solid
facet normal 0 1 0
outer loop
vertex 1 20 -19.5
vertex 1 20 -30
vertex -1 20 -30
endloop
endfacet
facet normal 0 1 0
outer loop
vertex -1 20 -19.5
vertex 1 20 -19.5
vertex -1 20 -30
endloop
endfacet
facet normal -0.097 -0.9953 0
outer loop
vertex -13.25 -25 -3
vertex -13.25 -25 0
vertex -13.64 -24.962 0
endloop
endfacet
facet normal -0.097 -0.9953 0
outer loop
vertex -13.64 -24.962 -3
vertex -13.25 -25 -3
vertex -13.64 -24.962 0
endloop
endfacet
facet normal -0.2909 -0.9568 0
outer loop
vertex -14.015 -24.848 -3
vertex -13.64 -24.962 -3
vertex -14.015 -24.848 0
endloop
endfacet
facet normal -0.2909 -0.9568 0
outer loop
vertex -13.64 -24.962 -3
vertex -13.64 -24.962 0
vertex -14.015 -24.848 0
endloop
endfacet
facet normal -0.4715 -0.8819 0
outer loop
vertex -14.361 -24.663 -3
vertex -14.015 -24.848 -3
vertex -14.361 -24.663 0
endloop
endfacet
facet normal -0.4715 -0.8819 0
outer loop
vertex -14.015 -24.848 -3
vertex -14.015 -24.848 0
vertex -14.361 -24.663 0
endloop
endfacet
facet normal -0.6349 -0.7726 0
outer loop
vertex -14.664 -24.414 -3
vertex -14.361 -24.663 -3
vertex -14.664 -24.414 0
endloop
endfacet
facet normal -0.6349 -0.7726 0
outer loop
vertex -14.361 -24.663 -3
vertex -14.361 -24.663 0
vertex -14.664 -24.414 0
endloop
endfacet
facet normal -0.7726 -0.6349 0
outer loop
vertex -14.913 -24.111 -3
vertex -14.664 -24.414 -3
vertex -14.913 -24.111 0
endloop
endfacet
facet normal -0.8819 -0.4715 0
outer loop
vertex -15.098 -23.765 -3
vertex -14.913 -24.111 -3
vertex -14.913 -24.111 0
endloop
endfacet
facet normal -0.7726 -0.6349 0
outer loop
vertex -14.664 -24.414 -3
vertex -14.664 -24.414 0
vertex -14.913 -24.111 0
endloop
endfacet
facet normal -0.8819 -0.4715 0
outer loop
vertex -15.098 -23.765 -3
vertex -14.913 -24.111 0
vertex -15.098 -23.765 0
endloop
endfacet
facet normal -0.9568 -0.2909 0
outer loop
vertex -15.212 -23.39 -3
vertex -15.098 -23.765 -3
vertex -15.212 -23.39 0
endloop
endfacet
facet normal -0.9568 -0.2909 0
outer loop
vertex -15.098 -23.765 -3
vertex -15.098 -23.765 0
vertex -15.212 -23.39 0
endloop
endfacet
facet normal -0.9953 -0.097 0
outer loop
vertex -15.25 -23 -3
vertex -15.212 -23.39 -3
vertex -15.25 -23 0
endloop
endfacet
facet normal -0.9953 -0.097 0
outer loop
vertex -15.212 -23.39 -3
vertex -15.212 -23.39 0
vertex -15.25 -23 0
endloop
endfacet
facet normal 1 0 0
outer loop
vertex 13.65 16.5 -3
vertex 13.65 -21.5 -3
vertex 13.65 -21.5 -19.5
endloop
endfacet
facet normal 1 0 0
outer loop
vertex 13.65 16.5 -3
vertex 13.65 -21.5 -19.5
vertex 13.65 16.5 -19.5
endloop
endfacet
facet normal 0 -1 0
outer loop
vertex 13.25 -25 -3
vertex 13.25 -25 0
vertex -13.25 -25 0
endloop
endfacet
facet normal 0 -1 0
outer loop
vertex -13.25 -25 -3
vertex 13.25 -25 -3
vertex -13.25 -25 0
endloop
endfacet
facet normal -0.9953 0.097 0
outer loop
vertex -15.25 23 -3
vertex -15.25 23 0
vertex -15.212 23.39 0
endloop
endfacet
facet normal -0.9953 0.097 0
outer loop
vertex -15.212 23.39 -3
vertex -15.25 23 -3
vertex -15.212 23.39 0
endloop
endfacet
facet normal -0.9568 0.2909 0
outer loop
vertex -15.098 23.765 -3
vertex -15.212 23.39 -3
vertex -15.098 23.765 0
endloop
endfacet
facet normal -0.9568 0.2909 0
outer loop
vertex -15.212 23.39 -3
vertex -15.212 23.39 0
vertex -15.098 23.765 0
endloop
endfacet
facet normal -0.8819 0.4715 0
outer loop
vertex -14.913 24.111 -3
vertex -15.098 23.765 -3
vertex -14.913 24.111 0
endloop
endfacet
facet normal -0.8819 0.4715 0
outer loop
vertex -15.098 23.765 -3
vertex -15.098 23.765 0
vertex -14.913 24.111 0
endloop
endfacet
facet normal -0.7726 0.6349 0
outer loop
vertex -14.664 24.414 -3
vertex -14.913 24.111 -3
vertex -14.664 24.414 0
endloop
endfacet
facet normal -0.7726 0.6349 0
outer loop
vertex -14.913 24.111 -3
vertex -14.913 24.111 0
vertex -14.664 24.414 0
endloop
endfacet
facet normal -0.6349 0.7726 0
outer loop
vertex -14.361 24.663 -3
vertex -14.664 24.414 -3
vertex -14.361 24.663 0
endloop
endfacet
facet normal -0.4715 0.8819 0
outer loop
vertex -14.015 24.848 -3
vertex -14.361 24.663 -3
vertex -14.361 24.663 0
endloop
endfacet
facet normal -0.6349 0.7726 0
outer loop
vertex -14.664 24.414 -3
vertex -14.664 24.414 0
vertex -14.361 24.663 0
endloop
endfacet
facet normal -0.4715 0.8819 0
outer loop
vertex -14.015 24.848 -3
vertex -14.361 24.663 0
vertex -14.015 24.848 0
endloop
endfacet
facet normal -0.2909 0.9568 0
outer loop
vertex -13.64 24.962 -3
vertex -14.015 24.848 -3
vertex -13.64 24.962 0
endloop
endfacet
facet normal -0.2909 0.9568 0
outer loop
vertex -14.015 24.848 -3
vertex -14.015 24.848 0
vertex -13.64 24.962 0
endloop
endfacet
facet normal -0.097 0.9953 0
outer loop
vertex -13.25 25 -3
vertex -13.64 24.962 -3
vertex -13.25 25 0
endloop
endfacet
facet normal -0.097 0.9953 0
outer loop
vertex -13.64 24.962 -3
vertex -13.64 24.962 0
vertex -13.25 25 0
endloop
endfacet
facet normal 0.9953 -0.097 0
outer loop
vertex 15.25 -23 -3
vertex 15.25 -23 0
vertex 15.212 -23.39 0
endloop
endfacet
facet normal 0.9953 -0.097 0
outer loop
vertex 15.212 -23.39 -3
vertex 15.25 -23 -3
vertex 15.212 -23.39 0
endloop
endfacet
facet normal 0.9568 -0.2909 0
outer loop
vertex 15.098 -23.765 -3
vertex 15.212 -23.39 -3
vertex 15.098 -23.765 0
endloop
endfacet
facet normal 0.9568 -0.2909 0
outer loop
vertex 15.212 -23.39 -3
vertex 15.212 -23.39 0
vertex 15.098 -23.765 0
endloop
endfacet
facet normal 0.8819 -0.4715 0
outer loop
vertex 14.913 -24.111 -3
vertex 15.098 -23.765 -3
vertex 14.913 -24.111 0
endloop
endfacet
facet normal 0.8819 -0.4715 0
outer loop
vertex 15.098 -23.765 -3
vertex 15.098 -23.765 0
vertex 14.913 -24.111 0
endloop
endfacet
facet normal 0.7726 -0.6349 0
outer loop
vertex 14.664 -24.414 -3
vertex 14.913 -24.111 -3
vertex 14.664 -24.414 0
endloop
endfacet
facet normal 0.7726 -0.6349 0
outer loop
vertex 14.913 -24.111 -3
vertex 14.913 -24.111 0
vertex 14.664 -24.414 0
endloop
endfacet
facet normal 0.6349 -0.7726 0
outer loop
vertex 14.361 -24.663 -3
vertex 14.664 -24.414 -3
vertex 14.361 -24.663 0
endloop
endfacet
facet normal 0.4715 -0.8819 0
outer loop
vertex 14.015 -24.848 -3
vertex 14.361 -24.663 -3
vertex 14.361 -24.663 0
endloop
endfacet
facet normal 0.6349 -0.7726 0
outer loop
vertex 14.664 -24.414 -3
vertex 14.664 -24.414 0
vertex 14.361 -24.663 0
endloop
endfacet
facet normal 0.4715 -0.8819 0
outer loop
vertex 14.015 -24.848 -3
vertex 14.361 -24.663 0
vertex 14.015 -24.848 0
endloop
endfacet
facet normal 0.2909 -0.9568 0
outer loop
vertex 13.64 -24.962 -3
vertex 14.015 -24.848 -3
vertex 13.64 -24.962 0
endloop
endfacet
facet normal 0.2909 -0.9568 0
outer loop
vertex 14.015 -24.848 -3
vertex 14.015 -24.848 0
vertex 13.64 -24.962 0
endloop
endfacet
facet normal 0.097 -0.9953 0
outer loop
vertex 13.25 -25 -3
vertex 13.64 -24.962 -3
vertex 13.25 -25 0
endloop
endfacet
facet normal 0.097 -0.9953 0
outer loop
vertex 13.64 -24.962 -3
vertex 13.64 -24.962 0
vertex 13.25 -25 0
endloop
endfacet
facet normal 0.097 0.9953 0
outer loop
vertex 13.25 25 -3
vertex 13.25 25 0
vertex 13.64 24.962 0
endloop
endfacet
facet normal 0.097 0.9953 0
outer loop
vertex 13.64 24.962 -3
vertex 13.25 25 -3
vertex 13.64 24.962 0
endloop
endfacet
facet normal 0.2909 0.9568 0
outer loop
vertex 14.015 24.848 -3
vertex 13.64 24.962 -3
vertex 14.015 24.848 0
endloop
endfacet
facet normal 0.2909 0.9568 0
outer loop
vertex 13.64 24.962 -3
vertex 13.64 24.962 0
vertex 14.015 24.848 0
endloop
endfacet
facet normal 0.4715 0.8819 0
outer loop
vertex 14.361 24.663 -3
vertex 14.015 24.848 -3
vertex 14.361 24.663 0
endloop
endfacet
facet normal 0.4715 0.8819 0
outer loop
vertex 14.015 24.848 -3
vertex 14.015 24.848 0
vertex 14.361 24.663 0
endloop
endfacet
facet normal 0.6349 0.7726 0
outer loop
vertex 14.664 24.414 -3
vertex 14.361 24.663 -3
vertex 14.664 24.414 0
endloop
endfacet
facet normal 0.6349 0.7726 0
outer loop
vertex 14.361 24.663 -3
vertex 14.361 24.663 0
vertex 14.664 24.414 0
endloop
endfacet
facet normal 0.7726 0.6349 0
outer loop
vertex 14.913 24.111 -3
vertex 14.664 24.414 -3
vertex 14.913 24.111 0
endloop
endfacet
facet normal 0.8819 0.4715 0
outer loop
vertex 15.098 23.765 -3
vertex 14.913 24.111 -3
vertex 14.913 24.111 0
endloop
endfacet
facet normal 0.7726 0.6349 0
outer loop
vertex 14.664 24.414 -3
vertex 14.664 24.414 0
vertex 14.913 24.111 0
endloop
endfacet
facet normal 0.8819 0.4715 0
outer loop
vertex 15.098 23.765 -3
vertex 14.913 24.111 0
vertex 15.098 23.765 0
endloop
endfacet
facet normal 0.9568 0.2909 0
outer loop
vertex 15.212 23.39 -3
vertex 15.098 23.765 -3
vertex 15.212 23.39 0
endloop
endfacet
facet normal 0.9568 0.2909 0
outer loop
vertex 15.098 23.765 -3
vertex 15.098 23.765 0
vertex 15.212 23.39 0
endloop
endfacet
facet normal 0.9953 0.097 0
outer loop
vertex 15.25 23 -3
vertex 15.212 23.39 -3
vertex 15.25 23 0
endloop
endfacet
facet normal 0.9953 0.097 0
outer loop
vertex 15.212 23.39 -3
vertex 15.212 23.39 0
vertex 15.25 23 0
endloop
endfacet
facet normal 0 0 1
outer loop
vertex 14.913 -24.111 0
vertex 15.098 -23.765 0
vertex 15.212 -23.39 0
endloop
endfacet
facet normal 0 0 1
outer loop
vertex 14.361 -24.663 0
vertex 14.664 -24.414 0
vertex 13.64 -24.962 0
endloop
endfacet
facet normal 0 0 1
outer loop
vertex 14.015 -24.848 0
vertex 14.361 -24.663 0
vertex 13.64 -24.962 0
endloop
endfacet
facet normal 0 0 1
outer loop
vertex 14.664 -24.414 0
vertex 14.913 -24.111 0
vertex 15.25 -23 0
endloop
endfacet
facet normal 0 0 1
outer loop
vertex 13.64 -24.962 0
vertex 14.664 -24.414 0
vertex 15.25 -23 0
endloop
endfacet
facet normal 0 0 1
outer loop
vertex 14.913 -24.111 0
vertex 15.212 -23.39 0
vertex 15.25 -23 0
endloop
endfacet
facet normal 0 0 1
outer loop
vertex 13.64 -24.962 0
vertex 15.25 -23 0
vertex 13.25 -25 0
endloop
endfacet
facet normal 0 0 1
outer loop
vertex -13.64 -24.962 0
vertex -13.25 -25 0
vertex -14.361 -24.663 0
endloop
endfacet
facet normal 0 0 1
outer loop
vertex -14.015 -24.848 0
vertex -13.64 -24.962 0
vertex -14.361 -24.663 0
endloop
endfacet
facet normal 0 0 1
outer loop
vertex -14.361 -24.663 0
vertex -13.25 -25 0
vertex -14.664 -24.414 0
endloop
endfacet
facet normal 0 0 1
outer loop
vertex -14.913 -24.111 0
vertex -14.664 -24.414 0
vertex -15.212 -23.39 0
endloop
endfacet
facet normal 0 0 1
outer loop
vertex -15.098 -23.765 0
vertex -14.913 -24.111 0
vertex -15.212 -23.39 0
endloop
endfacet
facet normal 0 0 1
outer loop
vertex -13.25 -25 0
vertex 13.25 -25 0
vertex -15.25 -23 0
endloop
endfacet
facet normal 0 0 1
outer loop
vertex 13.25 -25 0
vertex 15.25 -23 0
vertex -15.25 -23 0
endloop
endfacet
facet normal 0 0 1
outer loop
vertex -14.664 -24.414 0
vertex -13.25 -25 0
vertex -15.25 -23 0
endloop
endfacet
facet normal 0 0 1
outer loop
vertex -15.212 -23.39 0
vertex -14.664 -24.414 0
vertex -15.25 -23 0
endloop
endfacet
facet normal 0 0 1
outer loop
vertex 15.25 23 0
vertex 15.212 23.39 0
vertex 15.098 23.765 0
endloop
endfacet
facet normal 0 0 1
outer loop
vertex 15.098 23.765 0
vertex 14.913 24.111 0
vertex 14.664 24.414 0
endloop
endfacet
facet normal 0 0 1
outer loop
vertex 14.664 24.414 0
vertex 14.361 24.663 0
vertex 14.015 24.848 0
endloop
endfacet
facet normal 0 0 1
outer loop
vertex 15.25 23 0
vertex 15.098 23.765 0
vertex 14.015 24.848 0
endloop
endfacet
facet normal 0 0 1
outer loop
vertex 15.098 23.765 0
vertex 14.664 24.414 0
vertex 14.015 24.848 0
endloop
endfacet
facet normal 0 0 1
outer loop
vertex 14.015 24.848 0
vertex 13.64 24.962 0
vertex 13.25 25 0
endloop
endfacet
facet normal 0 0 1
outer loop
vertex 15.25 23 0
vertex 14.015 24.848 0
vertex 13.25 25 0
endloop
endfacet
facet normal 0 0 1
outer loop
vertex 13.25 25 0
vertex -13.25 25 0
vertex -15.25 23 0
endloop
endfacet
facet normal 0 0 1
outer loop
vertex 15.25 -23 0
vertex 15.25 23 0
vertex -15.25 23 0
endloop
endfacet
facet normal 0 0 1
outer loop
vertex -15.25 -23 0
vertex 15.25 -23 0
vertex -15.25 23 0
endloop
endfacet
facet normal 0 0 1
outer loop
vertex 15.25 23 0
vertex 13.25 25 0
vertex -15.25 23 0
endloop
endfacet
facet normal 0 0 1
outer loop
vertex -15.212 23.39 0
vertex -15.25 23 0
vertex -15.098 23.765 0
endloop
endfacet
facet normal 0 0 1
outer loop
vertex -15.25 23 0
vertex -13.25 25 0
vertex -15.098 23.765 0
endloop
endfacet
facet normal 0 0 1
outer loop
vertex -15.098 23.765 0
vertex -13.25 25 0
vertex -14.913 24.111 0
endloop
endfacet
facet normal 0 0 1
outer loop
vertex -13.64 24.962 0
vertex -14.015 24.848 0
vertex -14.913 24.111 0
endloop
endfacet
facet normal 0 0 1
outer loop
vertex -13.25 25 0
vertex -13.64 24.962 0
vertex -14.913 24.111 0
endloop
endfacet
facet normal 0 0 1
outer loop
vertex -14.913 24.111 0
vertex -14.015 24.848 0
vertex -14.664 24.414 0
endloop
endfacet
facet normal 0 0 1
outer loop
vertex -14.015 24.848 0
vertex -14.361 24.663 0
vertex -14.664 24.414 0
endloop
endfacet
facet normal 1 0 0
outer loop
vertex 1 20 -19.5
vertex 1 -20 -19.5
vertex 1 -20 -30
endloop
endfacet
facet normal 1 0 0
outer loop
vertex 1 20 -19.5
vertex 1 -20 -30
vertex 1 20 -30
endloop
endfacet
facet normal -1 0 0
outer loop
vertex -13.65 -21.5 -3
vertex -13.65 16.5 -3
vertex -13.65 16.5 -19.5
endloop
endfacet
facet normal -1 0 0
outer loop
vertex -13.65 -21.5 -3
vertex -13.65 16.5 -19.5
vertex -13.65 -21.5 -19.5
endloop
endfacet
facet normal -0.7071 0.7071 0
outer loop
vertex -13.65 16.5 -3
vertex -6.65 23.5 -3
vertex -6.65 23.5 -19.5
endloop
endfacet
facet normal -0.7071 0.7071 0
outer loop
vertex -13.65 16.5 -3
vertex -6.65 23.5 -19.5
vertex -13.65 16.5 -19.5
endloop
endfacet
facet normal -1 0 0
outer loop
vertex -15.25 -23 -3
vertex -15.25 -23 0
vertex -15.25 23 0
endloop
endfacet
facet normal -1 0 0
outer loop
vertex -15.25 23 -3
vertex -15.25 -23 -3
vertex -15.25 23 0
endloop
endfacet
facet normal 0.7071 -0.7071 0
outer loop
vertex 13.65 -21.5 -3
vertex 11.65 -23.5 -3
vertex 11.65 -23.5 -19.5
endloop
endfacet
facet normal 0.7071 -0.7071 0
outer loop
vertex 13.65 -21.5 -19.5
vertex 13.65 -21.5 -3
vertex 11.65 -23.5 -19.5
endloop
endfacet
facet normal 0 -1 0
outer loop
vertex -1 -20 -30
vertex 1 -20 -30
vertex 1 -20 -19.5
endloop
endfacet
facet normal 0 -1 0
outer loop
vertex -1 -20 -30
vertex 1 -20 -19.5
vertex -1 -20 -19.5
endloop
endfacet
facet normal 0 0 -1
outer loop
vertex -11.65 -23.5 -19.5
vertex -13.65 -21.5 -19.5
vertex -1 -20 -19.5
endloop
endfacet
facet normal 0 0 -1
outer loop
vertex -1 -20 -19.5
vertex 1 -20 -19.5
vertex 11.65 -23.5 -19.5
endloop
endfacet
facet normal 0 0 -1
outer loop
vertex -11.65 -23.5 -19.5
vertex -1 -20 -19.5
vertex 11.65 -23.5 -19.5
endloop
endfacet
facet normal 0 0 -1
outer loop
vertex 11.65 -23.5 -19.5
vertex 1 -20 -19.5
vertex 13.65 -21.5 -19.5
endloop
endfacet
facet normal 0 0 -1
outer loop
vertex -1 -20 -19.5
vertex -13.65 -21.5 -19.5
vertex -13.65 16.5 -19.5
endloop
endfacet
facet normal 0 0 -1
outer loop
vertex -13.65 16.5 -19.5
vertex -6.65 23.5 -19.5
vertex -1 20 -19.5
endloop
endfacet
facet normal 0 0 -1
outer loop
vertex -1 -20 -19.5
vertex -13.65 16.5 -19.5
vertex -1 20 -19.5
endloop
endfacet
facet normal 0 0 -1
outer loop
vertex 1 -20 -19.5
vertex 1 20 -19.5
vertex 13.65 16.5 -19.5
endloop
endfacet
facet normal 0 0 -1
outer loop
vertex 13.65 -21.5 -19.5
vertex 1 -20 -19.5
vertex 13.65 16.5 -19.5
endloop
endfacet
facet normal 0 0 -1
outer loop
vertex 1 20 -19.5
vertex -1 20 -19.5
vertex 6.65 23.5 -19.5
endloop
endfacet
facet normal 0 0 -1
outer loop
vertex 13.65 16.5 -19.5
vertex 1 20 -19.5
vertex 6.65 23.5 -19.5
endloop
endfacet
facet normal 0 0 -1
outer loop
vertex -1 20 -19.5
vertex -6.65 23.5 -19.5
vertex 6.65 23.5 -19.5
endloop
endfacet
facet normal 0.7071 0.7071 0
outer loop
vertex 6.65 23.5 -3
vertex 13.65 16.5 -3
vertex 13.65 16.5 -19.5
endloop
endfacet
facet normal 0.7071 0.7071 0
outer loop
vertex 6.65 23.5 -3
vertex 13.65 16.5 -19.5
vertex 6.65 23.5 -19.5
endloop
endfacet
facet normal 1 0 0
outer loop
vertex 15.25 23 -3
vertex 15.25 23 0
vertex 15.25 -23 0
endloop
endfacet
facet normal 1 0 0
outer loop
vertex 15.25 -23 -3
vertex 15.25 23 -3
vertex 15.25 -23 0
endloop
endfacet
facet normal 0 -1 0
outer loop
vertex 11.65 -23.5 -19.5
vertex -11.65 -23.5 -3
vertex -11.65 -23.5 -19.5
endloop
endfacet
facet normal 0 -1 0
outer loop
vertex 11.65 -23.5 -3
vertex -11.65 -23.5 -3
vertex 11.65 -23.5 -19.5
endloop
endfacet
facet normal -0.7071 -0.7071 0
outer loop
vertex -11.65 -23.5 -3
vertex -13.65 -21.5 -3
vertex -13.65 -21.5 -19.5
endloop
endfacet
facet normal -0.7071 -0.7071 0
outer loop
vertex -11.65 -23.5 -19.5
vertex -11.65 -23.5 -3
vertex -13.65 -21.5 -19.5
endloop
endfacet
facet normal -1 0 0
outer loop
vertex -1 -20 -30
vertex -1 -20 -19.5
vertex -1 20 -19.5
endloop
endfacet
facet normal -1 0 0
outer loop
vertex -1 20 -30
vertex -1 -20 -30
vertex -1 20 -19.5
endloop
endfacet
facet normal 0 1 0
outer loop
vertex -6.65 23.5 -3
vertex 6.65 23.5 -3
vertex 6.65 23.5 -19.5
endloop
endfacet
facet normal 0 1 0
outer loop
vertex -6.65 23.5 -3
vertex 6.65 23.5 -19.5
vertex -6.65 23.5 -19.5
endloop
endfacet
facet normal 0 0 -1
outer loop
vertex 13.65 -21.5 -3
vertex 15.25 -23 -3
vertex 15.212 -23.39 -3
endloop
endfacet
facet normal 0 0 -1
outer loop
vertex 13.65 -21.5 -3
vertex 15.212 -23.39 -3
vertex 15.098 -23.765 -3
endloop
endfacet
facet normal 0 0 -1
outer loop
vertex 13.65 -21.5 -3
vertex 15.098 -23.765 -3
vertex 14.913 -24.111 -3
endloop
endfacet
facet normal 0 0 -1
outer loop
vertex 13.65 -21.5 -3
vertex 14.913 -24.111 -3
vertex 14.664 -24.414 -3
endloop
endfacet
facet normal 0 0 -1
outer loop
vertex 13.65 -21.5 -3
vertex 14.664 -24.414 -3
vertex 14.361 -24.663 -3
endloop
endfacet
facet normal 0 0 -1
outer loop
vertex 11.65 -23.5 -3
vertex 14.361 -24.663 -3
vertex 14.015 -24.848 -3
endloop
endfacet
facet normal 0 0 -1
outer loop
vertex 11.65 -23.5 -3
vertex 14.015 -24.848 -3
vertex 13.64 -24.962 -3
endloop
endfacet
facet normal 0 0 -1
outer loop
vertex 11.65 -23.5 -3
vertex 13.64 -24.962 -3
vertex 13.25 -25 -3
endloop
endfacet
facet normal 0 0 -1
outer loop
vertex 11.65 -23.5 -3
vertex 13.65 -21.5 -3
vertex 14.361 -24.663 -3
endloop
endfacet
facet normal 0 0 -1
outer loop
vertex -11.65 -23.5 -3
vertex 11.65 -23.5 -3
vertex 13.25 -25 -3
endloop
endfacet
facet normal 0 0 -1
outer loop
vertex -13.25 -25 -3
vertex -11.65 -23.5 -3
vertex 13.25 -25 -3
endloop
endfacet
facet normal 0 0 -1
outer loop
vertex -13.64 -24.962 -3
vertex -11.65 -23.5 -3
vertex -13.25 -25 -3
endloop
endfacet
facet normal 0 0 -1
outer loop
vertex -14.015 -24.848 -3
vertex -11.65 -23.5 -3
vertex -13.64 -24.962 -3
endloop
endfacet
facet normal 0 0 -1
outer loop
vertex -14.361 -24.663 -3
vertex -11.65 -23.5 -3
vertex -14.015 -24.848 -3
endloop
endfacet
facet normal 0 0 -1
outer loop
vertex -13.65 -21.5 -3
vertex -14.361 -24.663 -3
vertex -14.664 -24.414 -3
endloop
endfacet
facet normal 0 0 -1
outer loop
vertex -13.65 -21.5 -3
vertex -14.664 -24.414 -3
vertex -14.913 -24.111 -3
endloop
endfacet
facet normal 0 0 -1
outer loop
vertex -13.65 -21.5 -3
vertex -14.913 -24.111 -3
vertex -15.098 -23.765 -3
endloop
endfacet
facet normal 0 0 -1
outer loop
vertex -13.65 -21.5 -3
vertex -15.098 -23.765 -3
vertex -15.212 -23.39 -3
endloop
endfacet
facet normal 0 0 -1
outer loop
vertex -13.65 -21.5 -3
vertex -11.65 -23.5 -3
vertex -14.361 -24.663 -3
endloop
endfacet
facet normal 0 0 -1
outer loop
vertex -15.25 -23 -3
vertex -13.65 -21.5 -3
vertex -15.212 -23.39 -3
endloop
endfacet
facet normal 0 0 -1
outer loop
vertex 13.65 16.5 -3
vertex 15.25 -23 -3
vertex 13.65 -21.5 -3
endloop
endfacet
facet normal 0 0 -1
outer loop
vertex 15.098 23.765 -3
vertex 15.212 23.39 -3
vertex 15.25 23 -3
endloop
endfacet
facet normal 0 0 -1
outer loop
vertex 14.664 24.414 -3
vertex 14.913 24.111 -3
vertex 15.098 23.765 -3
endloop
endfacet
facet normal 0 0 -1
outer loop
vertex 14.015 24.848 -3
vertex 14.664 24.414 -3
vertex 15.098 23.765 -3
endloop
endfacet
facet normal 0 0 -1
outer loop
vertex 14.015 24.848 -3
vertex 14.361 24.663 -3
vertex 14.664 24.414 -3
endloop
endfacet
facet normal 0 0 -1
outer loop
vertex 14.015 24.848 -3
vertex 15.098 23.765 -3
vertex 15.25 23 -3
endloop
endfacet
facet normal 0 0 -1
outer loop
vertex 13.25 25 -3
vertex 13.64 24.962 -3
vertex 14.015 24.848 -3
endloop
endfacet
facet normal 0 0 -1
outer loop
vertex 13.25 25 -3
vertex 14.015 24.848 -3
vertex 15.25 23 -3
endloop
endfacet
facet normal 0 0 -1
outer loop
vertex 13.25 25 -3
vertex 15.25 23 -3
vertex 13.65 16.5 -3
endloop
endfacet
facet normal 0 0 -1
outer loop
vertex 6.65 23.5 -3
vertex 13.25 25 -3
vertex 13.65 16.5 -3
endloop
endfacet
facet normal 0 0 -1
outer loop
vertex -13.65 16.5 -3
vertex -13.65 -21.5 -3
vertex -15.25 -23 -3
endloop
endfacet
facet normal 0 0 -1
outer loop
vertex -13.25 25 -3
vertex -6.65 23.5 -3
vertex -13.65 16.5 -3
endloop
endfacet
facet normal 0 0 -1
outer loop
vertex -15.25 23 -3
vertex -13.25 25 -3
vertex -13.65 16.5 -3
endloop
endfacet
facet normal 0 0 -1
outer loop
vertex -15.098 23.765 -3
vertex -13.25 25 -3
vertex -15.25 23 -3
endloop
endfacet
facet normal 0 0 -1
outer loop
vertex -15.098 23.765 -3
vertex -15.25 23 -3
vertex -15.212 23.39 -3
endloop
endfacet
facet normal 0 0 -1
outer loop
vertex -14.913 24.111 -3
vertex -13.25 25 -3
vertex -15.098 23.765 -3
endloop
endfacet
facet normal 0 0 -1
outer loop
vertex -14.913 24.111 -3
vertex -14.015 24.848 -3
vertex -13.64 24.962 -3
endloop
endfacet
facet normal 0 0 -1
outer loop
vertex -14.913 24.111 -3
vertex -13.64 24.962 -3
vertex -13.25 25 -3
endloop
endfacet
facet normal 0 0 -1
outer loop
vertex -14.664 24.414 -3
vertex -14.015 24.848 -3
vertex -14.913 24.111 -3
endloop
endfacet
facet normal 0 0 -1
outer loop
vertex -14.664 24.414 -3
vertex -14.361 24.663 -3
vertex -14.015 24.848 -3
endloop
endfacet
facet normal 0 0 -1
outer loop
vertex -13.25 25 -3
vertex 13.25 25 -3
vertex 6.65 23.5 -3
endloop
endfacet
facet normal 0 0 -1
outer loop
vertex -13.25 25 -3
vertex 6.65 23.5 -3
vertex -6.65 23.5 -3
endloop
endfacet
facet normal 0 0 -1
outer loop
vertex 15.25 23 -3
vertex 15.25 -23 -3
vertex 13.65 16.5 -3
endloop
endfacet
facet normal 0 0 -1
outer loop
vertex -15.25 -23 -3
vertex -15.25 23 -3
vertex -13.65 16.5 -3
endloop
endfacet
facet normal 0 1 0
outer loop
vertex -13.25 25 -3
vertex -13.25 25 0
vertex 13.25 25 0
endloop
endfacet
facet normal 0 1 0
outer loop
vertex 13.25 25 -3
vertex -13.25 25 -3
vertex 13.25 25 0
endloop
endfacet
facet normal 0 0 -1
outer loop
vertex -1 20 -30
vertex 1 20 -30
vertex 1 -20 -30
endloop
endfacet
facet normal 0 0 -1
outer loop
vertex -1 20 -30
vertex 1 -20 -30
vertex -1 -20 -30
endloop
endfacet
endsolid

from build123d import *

# Parameters (mm, degrees)
BOSS_EXTRUDE1_DEPTH = 3
BOSS_EXTRUDE2_DEPTH = 16.5
CHAMFER1_SIZE       = 2
SKETCH4_W           = 2
SKETCH4_H           = 40
BOSS_EXTRUDE3_DEPTH = 10.5


with BuildPart() as part:
    # Sketch1 → Boss-Extrude1 (new body)
    with BuildSketch(Plane.XY):
        with BuildLine():
            Line((-13.25, 25), (13.25, 25))
            ThreePointArc((13.25, 25), (14.664213562, 24.414213562), (15.25, 23))
            Line((15.25, 23), (15.25, -23))
            ThreePointArc((15.25, -23), (14.664213562, -24.414213562), (13.25, -25))
            Line((13.25, -25), (-13.25, -25))
            ThreePointArc((-13.25, -25), (-14.664213562, -24.414213562), (-15.25, -23))
            Line((-15.25, -23), (-15.25, 23))
            ThreePointArc((-15.25, 23), (-14.664213562, 24.414213562), (-13.25, 25))
        make_face()
    extrude(amount=-BOSS_EXTRUDE1_DEPTH)

    # Sketch2 → Boss-Extrude2 (add)
    with BuildSketch(Plane(origin=(0, 0, -3), x_dir=(-1, 0, 0), z_dir=(0, 0, -1))):
        Polygon((-13.65, 16.5), (-6.65, 23.5), (6.65, 23.5), (13.65, 16.5), (13.65, -23.5), (-13.65, -23.5), align=None)
    extrude(amount=BOSS_EXTRUDE2_DEPTH)

    # Chamfer1
    chamfer1_edges = [part.edges().sort_by_distance(p)[0] for p in [
        (-13.65, -23.5, -11.25),
        (13.65, -23.5, -11.25),
    ]]
    chamfer(chamfer1_edges, length=CHAMFER1_SIZE)

    # Sketch4 → Boss-Extrude3 (add)
    with BuildSketch(Plane(origin=(0, 0, -19.5), x_dir=(-1, 0, 0), z_dir=(0, 0, -1))):
        Rectangle(SKETCH4_W, SKETCH4_H)
    extrude(amount=BOSS_EXTRUDE3_DEPTH)


solid = part.part
